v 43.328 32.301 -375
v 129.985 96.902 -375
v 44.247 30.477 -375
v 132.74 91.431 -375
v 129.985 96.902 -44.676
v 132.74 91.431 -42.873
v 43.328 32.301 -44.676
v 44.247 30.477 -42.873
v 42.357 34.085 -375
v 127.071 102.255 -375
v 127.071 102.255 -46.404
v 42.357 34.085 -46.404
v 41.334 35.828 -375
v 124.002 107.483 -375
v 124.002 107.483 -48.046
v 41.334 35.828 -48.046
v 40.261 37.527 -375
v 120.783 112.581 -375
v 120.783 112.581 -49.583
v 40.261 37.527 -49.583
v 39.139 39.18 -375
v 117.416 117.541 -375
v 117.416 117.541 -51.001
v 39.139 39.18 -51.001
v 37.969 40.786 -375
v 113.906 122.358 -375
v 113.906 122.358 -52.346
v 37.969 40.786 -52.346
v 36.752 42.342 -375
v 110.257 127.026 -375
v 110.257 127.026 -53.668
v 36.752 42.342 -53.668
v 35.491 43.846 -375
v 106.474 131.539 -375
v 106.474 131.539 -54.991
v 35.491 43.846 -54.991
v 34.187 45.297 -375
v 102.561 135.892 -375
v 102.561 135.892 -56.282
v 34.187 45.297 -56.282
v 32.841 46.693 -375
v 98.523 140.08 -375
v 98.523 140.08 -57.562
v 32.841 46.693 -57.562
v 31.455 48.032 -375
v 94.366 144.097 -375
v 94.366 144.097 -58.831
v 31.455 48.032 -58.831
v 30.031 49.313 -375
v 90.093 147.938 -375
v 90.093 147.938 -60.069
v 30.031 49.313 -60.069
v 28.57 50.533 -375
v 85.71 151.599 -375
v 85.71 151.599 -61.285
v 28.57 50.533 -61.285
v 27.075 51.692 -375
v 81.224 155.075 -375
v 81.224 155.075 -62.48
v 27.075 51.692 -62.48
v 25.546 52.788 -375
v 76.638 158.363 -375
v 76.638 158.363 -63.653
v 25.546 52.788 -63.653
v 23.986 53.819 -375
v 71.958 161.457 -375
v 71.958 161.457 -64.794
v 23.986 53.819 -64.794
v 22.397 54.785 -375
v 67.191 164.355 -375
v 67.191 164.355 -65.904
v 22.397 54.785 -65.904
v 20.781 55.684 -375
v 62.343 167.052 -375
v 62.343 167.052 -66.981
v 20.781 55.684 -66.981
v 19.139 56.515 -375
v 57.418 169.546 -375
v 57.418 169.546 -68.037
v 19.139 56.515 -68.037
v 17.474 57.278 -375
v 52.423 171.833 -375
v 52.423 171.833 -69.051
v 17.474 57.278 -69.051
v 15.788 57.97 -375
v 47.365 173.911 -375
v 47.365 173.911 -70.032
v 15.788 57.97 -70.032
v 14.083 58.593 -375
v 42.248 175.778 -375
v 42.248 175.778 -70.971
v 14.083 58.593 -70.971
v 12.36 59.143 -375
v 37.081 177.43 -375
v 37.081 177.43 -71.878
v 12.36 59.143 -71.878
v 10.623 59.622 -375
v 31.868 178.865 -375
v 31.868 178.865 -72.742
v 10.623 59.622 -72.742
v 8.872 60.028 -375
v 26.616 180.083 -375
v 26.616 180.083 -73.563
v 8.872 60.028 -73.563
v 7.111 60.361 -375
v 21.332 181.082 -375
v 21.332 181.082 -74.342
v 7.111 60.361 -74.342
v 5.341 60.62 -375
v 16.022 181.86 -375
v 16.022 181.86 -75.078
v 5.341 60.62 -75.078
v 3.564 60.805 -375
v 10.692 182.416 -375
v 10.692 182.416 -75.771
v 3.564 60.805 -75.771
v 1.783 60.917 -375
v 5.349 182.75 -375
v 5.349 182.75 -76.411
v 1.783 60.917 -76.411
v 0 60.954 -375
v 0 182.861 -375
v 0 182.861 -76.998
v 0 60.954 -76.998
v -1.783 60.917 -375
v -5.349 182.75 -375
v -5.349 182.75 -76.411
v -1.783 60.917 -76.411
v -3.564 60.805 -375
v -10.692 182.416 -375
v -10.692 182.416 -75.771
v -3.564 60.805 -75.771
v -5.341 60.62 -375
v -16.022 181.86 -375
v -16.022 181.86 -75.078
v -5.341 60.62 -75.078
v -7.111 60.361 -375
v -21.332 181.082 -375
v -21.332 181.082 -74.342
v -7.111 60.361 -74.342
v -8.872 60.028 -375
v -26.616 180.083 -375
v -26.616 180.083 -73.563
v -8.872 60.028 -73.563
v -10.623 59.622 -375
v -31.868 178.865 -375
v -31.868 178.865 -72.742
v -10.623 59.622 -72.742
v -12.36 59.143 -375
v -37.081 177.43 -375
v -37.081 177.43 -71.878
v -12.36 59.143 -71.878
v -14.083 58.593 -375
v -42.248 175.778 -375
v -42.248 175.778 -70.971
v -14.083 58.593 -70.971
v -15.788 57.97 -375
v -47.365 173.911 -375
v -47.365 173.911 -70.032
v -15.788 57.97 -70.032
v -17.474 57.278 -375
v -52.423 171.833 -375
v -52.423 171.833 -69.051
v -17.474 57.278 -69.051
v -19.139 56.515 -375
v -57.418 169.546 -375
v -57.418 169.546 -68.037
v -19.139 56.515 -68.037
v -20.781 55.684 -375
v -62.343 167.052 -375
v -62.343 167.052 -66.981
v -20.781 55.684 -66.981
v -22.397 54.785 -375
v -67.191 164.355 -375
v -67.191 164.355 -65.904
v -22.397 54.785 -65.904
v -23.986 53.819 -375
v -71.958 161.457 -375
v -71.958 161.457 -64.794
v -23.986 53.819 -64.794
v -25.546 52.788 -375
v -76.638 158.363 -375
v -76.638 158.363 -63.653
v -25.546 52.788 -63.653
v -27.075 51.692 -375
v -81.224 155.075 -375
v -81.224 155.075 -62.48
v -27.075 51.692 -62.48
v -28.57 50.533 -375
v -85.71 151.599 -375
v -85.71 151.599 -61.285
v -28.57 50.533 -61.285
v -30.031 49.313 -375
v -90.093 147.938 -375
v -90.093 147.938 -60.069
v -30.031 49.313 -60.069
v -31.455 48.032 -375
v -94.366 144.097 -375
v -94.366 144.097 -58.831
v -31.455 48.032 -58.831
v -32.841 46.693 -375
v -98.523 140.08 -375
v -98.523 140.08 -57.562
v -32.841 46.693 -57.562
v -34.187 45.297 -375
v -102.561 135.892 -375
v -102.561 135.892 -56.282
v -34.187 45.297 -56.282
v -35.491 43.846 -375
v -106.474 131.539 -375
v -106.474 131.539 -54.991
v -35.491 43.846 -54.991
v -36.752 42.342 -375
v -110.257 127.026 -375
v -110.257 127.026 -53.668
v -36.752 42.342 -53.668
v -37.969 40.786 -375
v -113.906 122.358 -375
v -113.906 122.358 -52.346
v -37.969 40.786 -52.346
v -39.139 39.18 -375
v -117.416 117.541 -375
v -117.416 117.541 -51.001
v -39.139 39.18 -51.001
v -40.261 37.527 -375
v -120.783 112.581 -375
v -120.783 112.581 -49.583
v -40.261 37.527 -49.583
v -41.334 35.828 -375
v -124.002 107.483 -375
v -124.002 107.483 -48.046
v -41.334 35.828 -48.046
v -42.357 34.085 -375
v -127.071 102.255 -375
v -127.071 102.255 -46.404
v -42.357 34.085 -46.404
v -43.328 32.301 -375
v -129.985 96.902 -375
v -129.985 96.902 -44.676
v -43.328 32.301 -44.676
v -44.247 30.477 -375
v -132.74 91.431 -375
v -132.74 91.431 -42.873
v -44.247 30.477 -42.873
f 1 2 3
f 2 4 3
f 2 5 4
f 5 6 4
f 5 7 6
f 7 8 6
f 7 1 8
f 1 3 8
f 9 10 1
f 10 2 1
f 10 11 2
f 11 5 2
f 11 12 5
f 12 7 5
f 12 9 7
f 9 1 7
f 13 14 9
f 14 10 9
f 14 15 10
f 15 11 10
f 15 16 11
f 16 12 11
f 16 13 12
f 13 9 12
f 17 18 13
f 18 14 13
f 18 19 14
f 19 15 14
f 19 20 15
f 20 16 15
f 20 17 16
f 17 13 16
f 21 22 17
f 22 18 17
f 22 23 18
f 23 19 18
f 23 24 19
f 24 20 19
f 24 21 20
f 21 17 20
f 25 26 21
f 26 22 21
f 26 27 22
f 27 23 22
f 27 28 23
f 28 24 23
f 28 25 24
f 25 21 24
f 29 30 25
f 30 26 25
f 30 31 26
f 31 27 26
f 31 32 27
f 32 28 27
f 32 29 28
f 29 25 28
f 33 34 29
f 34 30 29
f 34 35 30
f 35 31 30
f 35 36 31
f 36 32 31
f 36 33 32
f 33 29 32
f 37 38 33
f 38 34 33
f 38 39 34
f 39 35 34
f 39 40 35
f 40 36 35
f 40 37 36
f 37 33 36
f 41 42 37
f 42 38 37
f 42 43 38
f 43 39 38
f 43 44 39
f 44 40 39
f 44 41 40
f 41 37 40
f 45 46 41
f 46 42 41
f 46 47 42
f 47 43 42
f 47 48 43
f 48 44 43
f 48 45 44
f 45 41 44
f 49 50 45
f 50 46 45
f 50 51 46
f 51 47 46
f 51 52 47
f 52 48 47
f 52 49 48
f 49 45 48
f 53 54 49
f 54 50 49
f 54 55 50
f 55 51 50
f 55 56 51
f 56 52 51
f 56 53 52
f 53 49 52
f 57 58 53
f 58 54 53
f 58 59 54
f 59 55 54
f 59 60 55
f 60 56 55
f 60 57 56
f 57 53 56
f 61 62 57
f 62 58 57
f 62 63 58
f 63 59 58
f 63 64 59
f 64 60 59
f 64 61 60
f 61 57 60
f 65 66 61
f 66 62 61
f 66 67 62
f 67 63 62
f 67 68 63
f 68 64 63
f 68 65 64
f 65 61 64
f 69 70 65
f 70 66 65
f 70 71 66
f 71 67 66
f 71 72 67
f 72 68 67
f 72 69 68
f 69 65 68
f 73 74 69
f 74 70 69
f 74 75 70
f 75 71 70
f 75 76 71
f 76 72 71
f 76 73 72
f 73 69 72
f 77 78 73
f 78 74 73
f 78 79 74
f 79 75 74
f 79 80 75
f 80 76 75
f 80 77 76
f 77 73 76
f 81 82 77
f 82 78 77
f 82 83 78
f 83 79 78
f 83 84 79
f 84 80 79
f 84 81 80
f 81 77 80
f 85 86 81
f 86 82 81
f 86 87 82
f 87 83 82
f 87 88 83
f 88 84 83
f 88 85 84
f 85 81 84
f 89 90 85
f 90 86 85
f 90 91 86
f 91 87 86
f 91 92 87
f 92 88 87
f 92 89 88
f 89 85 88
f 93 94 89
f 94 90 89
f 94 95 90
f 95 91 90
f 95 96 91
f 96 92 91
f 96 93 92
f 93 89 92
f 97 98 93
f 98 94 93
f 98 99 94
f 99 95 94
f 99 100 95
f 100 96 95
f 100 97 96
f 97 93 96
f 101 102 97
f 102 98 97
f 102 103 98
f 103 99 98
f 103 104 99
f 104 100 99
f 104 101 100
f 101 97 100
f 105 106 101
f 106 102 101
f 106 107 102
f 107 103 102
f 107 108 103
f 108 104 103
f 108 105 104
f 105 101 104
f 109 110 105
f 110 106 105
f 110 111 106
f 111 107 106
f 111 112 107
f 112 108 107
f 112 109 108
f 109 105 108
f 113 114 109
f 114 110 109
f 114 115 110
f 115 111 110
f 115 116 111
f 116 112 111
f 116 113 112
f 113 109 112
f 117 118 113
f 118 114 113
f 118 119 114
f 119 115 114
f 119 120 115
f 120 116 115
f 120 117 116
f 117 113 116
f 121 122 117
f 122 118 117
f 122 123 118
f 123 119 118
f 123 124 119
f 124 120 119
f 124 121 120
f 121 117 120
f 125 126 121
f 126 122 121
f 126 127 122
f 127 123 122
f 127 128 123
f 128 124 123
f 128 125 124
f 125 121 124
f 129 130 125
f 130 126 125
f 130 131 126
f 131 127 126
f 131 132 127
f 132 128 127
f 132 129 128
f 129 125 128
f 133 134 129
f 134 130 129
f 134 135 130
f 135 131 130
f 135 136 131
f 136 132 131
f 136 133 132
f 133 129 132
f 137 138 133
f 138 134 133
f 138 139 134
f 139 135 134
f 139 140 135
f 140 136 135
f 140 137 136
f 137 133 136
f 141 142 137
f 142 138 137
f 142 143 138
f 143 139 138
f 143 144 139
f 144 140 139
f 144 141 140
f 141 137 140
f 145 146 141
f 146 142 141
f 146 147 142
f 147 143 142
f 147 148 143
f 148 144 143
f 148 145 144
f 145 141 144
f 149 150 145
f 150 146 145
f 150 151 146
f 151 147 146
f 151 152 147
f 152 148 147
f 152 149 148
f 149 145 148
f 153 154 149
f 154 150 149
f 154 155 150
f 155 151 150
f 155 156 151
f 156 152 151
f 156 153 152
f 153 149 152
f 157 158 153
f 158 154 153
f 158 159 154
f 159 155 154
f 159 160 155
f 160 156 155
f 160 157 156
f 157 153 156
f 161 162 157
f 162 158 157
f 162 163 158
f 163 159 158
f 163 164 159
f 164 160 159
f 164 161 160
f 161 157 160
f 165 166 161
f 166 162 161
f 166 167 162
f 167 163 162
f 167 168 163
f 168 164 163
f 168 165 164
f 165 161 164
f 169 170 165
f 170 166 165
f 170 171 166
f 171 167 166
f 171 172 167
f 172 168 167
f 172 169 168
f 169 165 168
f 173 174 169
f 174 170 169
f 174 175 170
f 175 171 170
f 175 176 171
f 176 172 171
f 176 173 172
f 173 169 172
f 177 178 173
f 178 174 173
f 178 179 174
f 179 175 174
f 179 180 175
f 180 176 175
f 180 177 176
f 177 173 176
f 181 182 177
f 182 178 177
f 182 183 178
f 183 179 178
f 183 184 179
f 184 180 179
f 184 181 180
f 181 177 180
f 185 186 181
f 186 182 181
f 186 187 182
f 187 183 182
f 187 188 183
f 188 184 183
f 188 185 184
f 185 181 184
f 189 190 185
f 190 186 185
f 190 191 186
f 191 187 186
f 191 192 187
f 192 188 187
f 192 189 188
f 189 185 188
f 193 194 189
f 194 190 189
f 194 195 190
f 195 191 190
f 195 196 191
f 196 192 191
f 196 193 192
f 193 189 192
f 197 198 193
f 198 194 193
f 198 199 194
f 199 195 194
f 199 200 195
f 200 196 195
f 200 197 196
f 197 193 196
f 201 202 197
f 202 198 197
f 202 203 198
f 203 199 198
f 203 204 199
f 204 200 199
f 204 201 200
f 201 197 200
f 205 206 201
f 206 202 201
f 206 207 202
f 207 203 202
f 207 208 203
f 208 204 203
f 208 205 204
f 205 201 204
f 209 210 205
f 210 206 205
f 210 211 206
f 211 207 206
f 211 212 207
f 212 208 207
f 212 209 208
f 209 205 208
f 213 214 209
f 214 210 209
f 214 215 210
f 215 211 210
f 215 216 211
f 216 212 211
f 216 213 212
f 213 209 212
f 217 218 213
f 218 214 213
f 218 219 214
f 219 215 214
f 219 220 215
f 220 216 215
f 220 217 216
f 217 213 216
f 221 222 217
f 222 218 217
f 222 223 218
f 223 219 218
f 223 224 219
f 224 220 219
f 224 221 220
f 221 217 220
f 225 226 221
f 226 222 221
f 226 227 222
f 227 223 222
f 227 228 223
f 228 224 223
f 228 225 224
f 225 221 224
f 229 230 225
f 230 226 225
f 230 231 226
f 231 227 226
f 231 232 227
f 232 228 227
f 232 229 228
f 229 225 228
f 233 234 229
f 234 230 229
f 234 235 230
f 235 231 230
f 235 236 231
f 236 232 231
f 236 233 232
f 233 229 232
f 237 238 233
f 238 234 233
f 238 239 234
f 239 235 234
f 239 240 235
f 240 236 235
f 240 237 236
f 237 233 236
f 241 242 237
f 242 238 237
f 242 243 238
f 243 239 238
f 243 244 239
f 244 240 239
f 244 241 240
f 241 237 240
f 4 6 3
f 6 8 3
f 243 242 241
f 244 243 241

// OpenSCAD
include <winged_helmet_v13.scad>
part = "none"; build = "full";
neck_zone();
